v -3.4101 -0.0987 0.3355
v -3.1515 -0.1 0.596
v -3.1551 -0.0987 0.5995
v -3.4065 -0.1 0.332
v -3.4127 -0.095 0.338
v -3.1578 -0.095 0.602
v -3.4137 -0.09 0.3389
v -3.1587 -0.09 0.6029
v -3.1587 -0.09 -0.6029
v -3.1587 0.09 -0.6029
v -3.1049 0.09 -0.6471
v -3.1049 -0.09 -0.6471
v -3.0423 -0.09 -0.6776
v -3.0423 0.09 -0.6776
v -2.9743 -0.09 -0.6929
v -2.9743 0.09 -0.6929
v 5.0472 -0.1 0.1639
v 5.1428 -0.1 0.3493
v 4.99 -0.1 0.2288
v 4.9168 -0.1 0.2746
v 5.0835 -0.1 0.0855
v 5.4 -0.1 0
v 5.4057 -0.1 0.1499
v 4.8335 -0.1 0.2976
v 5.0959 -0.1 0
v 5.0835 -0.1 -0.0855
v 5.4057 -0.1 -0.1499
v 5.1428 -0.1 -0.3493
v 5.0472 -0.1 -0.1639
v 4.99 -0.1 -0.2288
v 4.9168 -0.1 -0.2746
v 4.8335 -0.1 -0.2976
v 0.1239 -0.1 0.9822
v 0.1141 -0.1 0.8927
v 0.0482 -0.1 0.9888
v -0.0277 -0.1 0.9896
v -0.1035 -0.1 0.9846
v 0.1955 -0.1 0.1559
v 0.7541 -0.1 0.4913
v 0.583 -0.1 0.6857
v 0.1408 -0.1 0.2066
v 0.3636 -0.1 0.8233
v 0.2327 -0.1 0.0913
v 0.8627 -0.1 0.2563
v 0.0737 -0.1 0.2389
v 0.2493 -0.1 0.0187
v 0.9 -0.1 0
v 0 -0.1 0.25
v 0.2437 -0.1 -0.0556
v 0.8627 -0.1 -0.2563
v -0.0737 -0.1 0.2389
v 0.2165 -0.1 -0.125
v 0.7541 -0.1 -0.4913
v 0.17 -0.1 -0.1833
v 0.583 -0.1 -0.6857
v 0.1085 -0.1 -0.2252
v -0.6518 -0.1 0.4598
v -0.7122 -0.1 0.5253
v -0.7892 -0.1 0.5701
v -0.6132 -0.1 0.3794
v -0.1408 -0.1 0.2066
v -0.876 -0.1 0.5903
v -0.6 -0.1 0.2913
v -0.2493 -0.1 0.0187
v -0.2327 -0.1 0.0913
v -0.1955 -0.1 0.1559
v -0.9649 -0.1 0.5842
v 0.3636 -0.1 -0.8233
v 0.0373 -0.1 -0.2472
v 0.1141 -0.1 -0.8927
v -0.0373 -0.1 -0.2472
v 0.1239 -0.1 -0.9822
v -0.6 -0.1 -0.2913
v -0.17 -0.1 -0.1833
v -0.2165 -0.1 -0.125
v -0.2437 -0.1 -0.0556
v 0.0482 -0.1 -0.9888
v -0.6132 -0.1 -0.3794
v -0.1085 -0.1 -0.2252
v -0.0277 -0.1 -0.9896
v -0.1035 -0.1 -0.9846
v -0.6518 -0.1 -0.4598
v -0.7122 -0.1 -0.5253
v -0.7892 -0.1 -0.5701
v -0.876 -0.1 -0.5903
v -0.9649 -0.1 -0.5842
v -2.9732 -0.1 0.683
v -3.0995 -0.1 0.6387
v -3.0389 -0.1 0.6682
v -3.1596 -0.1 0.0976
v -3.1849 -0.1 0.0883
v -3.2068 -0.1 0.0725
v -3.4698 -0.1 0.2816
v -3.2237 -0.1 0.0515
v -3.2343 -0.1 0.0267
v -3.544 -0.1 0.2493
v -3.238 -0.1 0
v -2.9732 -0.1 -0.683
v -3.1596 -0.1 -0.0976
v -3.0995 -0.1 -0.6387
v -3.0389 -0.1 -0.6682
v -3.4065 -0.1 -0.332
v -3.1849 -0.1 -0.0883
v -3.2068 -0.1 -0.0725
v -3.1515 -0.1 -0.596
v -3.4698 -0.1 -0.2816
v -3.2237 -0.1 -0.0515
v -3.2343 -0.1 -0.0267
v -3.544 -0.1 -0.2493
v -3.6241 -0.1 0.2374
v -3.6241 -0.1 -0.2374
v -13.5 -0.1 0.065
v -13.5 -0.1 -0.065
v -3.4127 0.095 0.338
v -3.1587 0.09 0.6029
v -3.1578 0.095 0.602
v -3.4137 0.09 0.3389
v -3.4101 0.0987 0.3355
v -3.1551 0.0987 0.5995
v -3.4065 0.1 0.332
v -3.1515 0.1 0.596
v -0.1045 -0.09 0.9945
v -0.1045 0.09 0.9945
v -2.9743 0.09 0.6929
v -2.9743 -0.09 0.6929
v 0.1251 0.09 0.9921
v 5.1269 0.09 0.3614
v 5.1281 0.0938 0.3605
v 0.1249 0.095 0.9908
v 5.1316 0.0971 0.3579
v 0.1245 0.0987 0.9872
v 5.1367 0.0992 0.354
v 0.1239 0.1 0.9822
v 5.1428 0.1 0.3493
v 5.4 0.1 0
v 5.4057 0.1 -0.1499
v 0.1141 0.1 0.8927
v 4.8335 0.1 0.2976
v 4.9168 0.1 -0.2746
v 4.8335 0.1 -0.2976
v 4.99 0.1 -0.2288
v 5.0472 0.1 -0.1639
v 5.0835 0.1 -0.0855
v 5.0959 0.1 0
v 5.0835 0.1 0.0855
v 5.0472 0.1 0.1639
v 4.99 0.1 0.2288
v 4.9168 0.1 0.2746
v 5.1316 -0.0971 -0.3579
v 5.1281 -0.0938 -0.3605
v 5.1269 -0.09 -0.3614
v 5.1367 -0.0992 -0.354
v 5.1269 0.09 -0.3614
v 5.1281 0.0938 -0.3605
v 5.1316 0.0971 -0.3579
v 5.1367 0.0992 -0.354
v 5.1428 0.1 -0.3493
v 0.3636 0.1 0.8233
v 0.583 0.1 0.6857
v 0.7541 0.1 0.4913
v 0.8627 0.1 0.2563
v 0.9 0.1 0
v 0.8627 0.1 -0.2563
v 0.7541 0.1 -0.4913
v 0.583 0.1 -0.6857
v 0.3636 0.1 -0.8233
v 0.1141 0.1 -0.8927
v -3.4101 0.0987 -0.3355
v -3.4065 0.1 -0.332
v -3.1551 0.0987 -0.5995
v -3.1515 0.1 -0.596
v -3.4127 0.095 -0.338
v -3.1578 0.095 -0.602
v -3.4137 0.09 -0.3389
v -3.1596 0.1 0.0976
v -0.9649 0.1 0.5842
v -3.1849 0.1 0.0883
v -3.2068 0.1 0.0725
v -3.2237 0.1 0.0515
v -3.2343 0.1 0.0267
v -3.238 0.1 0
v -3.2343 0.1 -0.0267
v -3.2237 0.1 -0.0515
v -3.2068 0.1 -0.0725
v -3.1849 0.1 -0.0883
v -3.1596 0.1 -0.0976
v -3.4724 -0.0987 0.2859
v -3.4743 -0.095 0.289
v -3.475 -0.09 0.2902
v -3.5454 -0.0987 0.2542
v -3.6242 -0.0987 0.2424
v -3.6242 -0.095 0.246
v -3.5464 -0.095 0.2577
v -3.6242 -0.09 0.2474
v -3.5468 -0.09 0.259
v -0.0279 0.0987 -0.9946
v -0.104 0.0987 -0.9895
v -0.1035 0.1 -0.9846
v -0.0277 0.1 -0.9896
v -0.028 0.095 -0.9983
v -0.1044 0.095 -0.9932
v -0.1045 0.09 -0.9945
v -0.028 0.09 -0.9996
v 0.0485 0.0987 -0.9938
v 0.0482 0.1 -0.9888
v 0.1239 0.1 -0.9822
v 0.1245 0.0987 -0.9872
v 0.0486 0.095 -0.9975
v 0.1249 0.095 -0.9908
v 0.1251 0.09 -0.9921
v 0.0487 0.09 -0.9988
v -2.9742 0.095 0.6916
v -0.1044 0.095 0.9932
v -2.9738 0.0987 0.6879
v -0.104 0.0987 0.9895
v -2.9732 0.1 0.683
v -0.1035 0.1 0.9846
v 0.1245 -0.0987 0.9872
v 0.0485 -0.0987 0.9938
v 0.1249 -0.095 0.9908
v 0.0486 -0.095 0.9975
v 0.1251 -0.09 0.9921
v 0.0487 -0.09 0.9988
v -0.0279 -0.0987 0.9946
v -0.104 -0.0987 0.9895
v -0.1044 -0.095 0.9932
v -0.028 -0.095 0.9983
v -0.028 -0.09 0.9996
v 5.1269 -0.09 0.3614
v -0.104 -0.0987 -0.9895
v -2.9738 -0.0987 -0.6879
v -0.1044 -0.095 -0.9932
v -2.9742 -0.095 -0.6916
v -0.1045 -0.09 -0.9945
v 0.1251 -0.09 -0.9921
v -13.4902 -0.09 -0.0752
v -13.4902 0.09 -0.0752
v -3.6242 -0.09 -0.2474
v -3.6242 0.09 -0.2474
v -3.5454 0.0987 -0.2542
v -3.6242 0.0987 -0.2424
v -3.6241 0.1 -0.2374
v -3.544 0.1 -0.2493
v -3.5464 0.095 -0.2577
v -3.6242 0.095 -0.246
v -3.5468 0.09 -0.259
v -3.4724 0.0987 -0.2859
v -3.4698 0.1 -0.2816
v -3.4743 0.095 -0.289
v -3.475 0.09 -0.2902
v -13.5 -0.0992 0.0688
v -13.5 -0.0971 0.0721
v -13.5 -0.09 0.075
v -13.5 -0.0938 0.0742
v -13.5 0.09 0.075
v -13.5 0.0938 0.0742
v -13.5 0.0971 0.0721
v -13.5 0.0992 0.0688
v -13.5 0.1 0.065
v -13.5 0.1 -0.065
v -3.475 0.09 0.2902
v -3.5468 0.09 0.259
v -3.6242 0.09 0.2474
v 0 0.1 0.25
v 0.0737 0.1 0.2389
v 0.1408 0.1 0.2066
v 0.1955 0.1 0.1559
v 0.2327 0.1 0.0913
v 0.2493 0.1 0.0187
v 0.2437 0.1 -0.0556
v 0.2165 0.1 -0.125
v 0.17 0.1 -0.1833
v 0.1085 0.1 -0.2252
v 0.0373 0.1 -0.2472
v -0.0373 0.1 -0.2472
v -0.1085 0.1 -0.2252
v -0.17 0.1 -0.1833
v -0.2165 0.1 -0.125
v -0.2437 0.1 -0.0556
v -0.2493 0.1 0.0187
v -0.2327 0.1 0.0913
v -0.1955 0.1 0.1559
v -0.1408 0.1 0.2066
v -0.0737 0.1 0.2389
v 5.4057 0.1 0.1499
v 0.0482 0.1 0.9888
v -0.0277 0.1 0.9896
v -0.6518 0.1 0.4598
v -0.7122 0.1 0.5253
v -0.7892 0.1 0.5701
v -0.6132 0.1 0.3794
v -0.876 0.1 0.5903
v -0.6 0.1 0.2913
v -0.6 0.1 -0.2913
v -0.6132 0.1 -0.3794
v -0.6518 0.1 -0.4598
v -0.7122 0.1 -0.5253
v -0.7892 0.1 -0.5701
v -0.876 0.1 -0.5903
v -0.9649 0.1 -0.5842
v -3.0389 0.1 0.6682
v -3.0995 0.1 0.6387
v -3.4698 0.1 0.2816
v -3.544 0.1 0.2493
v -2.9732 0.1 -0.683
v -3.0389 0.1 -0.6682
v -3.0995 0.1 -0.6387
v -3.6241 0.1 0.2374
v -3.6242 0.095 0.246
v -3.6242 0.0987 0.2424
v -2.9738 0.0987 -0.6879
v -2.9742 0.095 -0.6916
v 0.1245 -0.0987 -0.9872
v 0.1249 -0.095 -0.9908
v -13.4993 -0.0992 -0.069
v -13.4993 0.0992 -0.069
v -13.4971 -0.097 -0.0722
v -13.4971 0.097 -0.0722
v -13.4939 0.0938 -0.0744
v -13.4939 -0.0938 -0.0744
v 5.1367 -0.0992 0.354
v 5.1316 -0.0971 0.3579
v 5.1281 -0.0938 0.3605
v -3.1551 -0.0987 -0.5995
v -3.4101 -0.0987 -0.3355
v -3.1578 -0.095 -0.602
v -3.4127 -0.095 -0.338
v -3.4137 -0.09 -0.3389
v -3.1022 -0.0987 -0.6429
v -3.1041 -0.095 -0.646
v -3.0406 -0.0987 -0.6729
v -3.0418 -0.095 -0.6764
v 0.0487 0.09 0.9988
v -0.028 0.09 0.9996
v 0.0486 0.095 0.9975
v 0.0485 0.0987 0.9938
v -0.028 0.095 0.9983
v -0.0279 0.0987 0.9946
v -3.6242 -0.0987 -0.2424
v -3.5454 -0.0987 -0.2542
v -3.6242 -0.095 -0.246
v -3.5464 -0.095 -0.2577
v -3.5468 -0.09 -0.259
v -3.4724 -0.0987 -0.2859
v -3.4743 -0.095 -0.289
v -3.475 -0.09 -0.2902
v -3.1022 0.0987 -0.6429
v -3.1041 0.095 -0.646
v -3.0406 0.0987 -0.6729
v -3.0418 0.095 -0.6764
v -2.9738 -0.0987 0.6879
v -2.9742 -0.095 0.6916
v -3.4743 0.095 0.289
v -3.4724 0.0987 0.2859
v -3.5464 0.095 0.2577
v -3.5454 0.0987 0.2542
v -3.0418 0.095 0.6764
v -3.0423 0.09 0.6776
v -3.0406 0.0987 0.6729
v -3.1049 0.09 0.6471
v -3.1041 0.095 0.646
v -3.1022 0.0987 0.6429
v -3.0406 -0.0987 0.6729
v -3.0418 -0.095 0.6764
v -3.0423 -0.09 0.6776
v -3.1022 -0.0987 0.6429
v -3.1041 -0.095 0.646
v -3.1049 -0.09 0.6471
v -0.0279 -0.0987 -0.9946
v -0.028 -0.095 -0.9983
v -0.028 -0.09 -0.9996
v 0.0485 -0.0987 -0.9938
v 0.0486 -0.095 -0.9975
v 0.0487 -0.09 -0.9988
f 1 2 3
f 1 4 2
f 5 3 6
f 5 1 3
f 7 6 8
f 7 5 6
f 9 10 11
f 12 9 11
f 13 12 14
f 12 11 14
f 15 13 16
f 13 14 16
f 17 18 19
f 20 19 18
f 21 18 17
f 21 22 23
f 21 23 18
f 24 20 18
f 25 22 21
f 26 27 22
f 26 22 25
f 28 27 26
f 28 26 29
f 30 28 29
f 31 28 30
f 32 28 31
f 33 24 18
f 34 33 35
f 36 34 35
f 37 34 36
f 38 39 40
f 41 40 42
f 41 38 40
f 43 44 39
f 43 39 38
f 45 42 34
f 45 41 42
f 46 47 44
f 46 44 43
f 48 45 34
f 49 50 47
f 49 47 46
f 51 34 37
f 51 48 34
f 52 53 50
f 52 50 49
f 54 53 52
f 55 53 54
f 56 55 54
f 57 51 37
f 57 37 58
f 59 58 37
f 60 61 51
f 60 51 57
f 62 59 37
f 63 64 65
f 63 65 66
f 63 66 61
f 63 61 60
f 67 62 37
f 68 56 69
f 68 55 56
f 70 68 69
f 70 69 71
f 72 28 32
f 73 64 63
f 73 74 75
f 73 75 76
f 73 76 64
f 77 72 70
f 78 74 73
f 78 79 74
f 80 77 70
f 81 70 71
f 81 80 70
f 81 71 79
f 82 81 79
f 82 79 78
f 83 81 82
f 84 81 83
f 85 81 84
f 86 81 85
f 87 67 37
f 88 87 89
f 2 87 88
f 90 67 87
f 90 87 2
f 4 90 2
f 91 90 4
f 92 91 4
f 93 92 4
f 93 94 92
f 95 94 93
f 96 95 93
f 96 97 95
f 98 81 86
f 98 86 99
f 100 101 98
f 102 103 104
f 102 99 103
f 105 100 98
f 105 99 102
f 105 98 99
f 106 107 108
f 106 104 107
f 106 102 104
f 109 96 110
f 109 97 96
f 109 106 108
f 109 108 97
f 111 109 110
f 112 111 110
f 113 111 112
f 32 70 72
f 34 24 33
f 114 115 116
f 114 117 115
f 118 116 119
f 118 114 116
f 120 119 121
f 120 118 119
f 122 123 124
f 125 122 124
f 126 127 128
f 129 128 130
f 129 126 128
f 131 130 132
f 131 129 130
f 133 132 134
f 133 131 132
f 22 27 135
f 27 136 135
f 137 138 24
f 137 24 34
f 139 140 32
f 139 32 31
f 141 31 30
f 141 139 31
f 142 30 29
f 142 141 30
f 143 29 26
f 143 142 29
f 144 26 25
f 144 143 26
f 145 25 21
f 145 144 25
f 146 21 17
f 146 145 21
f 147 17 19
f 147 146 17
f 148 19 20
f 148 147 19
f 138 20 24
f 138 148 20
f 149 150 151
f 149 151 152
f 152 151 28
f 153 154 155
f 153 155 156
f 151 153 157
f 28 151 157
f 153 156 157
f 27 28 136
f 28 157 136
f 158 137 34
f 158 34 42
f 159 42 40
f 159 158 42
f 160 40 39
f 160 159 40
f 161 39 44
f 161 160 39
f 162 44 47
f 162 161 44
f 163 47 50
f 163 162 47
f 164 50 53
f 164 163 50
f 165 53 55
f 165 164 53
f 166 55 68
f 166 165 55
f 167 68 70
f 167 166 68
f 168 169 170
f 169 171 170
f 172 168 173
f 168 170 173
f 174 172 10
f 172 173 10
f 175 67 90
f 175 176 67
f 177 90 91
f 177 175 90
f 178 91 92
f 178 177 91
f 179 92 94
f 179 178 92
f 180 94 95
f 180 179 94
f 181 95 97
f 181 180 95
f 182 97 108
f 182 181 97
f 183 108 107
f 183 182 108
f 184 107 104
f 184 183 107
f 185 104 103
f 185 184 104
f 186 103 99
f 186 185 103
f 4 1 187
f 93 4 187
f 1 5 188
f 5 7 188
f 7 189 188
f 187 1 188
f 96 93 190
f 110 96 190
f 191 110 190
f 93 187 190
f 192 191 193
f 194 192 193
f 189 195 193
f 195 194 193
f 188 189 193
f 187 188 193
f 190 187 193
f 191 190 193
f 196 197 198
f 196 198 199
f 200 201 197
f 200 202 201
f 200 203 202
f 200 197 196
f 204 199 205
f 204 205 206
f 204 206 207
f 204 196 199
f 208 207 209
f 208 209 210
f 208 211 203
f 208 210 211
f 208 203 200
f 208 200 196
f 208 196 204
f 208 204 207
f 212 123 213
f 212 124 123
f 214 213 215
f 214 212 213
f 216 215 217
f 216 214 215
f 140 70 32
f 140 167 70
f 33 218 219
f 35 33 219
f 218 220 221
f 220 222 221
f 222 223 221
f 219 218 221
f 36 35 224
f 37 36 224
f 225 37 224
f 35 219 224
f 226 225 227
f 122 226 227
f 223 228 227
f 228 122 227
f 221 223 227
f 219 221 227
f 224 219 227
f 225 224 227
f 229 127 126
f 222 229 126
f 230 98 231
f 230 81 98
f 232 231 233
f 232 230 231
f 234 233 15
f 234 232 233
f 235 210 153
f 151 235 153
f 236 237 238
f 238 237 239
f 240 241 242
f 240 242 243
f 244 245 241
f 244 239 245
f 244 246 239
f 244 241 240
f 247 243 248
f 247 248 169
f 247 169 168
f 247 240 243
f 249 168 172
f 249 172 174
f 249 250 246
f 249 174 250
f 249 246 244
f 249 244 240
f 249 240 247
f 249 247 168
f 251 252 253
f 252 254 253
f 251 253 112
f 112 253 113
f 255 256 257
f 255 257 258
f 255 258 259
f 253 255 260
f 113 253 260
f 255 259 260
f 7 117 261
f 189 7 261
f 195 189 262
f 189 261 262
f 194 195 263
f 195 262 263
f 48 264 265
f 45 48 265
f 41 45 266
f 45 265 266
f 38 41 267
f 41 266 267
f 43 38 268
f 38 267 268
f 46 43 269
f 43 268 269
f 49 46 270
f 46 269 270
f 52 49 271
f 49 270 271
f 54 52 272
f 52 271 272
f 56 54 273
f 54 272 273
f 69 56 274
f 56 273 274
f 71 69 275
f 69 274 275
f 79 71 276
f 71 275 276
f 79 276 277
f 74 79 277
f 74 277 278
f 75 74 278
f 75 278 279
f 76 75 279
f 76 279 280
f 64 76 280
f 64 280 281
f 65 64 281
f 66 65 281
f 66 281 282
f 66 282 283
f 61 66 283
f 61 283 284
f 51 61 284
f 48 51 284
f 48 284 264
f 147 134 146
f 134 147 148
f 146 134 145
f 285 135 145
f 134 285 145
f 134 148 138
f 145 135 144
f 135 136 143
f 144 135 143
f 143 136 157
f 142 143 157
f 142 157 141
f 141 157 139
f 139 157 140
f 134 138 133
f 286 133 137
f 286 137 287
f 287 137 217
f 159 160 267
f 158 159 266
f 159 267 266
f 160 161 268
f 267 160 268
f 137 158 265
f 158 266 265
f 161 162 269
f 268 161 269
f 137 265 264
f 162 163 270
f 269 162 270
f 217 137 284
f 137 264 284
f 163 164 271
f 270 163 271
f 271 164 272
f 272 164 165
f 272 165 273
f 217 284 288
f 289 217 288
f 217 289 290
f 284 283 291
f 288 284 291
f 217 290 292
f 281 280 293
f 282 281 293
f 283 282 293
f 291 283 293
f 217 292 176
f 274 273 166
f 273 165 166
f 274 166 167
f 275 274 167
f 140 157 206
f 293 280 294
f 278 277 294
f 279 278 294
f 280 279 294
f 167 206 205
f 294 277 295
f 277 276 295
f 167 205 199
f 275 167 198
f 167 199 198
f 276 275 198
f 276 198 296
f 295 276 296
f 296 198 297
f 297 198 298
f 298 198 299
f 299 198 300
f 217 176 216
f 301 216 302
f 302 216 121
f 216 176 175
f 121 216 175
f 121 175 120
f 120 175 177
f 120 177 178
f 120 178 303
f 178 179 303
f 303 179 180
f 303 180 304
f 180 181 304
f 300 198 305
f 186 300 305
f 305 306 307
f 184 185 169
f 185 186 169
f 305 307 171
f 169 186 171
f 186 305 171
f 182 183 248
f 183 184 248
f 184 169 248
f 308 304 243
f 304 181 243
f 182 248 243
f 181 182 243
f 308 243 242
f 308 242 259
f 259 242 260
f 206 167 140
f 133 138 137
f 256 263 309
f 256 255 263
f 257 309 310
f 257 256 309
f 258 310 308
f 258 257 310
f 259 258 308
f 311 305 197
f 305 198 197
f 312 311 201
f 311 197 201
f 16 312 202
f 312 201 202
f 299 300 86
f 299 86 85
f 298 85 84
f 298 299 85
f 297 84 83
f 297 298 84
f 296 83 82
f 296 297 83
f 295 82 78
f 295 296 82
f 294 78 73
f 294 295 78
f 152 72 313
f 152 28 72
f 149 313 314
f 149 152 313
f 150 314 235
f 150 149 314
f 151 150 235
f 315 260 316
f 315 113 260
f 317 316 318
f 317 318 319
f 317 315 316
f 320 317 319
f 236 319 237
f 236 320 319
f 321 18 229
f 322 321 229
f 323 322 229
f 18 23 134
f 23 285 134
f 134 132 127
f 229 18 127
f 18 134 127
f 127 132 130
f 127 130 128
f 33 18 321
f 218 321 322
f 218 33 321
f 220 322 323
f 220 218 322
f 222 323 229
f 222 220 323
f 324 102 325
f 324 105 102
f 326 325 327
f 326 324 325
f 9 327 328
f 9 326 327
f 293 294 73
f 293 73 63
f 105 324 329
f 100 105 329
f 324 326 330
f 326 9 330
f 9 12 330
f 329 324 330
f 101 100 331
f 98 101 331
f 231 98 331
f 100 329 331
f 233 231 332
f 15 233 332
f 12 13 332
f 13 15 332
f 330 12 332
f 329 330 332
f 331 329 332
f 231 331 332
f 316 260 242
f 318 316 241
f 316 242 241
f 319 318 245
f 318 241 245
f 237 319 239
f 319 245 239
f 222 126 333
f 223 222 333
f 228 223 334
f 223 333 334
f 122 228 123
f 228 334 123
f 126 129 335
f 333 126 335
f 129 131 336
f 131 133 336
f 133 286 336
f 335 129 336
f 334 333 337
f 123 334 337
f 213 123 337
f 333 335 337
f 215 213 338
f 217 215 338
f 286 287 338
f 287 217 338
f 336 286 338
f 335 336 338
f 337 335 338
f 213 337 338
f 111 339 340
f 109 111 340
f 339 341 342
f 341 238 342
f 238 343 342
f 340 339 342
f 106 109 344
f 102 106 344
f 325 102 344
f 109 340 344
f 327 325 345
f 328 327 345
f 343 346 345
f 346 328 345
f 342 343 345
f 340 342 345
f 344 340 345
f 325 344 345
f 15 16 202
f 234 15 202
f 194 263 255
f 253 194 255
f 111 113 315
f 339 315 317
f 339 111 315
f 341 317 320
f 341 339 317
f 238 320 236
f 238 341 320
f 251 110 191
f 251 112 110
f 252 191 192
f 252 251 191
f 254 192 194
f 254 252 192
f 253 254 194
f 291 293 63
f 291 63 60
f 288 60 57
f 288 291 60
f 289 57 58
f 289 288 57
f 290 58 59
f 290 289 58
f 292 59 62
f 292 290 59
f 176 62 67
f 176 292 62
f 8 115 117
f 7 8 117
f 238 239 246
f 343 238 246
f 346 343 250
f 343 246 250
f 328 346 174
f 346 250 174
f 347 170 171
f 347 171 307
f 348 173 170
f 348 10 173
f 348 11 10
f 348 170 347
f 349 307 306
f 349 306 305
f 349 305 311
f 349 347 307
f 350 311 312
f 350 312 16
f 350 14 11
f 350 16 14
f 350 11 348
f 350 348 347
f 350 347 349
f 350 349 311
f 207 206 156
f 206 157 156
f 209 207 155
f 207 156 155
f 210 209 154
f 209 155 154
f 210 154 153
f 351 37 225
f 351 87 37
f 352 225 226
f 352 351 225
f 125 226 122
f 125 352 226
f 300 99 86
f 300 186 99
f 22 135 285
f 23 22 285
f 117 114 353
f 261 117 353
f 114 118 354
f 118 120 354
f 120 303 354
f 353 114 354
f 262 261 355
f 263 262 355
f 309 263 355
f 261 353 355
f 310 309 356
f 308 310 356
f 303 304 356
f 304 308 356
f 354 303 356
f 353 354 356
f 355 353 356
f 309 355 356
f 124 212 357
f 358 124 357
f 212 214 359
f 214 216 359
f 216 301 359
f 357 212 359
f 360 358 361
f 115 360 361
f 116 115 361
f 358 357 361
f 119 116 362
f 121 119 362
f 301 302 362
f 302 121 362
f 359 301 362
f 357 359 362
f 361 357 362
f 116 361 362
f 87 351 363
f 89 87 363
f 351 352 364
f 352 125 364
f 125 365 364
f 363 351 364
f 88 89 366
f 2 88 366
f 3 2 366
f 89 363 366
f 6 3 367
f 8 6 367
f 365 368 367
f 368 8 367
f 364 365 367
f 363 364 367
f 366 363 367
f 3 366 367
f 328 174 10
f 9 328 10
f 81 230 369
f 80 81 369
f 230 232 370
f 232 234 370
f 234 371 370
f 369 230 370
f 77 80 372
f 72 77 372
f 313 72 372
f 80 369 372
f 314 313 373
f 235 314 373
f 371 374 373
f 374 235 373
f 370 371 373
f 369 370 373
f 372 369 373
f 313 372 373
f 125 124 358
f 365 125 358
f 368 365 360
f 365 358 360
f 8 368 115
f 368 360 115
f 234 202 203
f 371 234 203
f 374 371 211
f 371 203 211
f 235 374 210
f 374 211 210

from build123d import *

# Parameters (mm, degrees)
BOSS_EXTRUDE1_DEPTH = 0.1
SKETCH2_R           = 0.25
CUT_EXTRUDE1_DEPTH  = 14.538463724
FILLET1_R           = 0.01


with BuildPart() as part:
    # Sketch1 → Boss-Extrude1 (new, symmetric)
    with BuildSketch(Plane(origin=(0, 0, 0), x_dir=(1, 0, 0), z_dir=(0, 1, 0))):
        with BuildLine():
            Line((-13.5, -0.075), (-13.5, 0.075))
            Line((-13.5, 0.075), (-3.624245143, 0.247381942))
            ThreePointArc((-3.624245143, 0.247381942), (-3.509856144, 0.272218228), (-3.413678925, 0.33893874))
            Line((-3.413678925, 0.33893874), (-3.158737497, 0.602938316))
            ThreePointArc((-3.158737497, 0.602938316), (-3.074446901, 0.664179018), (-2.974294096, 0.692897373))
            Line((-2.974294096, 0.692897373), (-0.104528463, 0.994521895))
            ThreePointArc((-0.104528463, 0.994521895), (0.010357122, 0.999946364), (0.125105703, 0.992143419))
            Line((0.125105703, 0.992143419), (5.126889803, 0.361436503))
            Line((5.126889803, 0.361436503), (5.405723796, 0.149890754))
            Line((5.405723796, 0.149890754), (5.4, 0))
            Line((5.4, 0), (5.405723796, -0.149890754))
            Line((5.405723796, -0.149890754), (5.126889803, -0.361436503))
            Line((5.126889803, -0.361436503), (0.125105703, -0.992143419))
            ThreePointArc((0.125105703, -0.992143419), (0.010357122, -0.999946364), (-0.104528463, -0.994521895))
            Line((-0.104528463, -0.994521895), (-2.974294096, -0.692897373))
            ThreePointArc((-2.974294096, -0.692897373), (-3.074446901, -0.664179018), (-3.158737497, -0.602938316))
            Line((-3.158737497, -0.602938316), (-3.413678925, -0.33893874))
            ThreePointArc((-3.413678925, -0.33893874), (-3.509856144, -0.272218228), (-3.624245143, -0.247381942))
            Line((-3.624245143, -0.247381942), (-13.5, -0.075))
        make_face()
        with BuildLine():
            Line((-3.15962133, 0.097629601), (-0.964931884, 0.584180537))
            ThreePointArc((-0.964931884, 0.584180537), (-0.712222958, 0.52525708), (-0.6, 0.291291735))
            Line((-0.6, 0.291291735), (-0.6, -0.291291735))
            ThreePointArc((-0.6, -0.291291735), (-0.712222958, -0.52525708), (-0.964931884, -0.584180537))
            Line((-0.964931884, -0.584180537), (-3.15962133, -0.097629601))
            ThreePointArc((-3.15962133, -0.097629601), (-3.237977368, 0), (-3.15962133, 0.097629601))
        make_face(mode=Mode.SUBTRACT)
        with BuildLine():
            Line((0.114136342, 0.892733384), (4.833465433, 0.297643026))
            ThreePointArc((4.833465433, 0.297643026), (5.095933723, 0), (4.833465433, -0.297643026))
            Line((4.833465433, -0.297643026), (0.114136342, -0.892733384))
            ThreePointArc((0.114136342, -0.892733384), (0.9, 0), (0.114136342, 0.892733384))
        make_face(mode=Mode.SUBTRACT)
    extrude(amount=BOSS_EXTRUDE1_DEPTH, both=True)

    # Sketch2 → Cut-Extrude1 (cut, through all)
    with BuildSketch(Plane(origin=(0, 0.1, 0), x_dir=(1, 0, 0), z_dir=(0, 1, 0))):
        with Locations(Location((0, 0, 0), (0, 0, 270))):
            Circle(SKETCH2_R)
    extrude(amount=-CUT_EXTRUDE1_DEPTH, mode=Mode.SUBTRACT)

    # Fillet1
    fillet1_edges = [part.edges().sort_by_distance(p)[0] for p in [
        (2.625997753, 0.1, -0.676789961),
        (0.010357122, 0.1, -0.999946364),
        (2.625997753, -0.1, 0.676789961),
        (0.010357122, -0.1, 0.999946364),
        (-1.53941128, -0.1, 0.843709634),
        (-3.074446901, -0.1, 0.664179018),
        (-3.286208211, -0.1, 0.470938528),
        (-3.509856144, -0.1, 0.272218228),
        (-1.53941128, 0.1, -0.843709634),
        (-8.562122571, -0.1, 0.161190971),
        (-8.562122571, -0.1, -0.161190971),
        (-3.509856144, -0.1, -0.272218228),
        (-3.286208211, -0.1, -0.470938528),
        (-3.074446901, -0.1, -0.664179018),
        (-1.53941128, -0.1, -0.843709634),
        (-3.074446901, 0.1, -0.664179018),
        (0.010357122, -0.1, -0.999946364),
        (2.625997753, -0.1, -0.676789961),
        (-3.286208211, 0.1, -0.470938528),
        (-3.509856144, 0.1, -0.272218228),
        (-13.5, 0, -0.075),
        (-8.562122571, 0.1, -0.161190971),
        (-8.562122571, 0.1, 0.161190971),
        (-3.509856144, 0.1, 0.272218228),
        (-3.286208211, 0.1, 0.470938528),
        (-3.074446901, 0.1, 0.664179018),
        (-1.53941128, 0.1, 0.843709634),
        (0.010357122, 0.1, 0.999946364),
        (2.625997753, 0.1, 0.676789961),
    ]]
    fillet(fillet1_edges, radius=FILLET1_R)


solid = part.part
